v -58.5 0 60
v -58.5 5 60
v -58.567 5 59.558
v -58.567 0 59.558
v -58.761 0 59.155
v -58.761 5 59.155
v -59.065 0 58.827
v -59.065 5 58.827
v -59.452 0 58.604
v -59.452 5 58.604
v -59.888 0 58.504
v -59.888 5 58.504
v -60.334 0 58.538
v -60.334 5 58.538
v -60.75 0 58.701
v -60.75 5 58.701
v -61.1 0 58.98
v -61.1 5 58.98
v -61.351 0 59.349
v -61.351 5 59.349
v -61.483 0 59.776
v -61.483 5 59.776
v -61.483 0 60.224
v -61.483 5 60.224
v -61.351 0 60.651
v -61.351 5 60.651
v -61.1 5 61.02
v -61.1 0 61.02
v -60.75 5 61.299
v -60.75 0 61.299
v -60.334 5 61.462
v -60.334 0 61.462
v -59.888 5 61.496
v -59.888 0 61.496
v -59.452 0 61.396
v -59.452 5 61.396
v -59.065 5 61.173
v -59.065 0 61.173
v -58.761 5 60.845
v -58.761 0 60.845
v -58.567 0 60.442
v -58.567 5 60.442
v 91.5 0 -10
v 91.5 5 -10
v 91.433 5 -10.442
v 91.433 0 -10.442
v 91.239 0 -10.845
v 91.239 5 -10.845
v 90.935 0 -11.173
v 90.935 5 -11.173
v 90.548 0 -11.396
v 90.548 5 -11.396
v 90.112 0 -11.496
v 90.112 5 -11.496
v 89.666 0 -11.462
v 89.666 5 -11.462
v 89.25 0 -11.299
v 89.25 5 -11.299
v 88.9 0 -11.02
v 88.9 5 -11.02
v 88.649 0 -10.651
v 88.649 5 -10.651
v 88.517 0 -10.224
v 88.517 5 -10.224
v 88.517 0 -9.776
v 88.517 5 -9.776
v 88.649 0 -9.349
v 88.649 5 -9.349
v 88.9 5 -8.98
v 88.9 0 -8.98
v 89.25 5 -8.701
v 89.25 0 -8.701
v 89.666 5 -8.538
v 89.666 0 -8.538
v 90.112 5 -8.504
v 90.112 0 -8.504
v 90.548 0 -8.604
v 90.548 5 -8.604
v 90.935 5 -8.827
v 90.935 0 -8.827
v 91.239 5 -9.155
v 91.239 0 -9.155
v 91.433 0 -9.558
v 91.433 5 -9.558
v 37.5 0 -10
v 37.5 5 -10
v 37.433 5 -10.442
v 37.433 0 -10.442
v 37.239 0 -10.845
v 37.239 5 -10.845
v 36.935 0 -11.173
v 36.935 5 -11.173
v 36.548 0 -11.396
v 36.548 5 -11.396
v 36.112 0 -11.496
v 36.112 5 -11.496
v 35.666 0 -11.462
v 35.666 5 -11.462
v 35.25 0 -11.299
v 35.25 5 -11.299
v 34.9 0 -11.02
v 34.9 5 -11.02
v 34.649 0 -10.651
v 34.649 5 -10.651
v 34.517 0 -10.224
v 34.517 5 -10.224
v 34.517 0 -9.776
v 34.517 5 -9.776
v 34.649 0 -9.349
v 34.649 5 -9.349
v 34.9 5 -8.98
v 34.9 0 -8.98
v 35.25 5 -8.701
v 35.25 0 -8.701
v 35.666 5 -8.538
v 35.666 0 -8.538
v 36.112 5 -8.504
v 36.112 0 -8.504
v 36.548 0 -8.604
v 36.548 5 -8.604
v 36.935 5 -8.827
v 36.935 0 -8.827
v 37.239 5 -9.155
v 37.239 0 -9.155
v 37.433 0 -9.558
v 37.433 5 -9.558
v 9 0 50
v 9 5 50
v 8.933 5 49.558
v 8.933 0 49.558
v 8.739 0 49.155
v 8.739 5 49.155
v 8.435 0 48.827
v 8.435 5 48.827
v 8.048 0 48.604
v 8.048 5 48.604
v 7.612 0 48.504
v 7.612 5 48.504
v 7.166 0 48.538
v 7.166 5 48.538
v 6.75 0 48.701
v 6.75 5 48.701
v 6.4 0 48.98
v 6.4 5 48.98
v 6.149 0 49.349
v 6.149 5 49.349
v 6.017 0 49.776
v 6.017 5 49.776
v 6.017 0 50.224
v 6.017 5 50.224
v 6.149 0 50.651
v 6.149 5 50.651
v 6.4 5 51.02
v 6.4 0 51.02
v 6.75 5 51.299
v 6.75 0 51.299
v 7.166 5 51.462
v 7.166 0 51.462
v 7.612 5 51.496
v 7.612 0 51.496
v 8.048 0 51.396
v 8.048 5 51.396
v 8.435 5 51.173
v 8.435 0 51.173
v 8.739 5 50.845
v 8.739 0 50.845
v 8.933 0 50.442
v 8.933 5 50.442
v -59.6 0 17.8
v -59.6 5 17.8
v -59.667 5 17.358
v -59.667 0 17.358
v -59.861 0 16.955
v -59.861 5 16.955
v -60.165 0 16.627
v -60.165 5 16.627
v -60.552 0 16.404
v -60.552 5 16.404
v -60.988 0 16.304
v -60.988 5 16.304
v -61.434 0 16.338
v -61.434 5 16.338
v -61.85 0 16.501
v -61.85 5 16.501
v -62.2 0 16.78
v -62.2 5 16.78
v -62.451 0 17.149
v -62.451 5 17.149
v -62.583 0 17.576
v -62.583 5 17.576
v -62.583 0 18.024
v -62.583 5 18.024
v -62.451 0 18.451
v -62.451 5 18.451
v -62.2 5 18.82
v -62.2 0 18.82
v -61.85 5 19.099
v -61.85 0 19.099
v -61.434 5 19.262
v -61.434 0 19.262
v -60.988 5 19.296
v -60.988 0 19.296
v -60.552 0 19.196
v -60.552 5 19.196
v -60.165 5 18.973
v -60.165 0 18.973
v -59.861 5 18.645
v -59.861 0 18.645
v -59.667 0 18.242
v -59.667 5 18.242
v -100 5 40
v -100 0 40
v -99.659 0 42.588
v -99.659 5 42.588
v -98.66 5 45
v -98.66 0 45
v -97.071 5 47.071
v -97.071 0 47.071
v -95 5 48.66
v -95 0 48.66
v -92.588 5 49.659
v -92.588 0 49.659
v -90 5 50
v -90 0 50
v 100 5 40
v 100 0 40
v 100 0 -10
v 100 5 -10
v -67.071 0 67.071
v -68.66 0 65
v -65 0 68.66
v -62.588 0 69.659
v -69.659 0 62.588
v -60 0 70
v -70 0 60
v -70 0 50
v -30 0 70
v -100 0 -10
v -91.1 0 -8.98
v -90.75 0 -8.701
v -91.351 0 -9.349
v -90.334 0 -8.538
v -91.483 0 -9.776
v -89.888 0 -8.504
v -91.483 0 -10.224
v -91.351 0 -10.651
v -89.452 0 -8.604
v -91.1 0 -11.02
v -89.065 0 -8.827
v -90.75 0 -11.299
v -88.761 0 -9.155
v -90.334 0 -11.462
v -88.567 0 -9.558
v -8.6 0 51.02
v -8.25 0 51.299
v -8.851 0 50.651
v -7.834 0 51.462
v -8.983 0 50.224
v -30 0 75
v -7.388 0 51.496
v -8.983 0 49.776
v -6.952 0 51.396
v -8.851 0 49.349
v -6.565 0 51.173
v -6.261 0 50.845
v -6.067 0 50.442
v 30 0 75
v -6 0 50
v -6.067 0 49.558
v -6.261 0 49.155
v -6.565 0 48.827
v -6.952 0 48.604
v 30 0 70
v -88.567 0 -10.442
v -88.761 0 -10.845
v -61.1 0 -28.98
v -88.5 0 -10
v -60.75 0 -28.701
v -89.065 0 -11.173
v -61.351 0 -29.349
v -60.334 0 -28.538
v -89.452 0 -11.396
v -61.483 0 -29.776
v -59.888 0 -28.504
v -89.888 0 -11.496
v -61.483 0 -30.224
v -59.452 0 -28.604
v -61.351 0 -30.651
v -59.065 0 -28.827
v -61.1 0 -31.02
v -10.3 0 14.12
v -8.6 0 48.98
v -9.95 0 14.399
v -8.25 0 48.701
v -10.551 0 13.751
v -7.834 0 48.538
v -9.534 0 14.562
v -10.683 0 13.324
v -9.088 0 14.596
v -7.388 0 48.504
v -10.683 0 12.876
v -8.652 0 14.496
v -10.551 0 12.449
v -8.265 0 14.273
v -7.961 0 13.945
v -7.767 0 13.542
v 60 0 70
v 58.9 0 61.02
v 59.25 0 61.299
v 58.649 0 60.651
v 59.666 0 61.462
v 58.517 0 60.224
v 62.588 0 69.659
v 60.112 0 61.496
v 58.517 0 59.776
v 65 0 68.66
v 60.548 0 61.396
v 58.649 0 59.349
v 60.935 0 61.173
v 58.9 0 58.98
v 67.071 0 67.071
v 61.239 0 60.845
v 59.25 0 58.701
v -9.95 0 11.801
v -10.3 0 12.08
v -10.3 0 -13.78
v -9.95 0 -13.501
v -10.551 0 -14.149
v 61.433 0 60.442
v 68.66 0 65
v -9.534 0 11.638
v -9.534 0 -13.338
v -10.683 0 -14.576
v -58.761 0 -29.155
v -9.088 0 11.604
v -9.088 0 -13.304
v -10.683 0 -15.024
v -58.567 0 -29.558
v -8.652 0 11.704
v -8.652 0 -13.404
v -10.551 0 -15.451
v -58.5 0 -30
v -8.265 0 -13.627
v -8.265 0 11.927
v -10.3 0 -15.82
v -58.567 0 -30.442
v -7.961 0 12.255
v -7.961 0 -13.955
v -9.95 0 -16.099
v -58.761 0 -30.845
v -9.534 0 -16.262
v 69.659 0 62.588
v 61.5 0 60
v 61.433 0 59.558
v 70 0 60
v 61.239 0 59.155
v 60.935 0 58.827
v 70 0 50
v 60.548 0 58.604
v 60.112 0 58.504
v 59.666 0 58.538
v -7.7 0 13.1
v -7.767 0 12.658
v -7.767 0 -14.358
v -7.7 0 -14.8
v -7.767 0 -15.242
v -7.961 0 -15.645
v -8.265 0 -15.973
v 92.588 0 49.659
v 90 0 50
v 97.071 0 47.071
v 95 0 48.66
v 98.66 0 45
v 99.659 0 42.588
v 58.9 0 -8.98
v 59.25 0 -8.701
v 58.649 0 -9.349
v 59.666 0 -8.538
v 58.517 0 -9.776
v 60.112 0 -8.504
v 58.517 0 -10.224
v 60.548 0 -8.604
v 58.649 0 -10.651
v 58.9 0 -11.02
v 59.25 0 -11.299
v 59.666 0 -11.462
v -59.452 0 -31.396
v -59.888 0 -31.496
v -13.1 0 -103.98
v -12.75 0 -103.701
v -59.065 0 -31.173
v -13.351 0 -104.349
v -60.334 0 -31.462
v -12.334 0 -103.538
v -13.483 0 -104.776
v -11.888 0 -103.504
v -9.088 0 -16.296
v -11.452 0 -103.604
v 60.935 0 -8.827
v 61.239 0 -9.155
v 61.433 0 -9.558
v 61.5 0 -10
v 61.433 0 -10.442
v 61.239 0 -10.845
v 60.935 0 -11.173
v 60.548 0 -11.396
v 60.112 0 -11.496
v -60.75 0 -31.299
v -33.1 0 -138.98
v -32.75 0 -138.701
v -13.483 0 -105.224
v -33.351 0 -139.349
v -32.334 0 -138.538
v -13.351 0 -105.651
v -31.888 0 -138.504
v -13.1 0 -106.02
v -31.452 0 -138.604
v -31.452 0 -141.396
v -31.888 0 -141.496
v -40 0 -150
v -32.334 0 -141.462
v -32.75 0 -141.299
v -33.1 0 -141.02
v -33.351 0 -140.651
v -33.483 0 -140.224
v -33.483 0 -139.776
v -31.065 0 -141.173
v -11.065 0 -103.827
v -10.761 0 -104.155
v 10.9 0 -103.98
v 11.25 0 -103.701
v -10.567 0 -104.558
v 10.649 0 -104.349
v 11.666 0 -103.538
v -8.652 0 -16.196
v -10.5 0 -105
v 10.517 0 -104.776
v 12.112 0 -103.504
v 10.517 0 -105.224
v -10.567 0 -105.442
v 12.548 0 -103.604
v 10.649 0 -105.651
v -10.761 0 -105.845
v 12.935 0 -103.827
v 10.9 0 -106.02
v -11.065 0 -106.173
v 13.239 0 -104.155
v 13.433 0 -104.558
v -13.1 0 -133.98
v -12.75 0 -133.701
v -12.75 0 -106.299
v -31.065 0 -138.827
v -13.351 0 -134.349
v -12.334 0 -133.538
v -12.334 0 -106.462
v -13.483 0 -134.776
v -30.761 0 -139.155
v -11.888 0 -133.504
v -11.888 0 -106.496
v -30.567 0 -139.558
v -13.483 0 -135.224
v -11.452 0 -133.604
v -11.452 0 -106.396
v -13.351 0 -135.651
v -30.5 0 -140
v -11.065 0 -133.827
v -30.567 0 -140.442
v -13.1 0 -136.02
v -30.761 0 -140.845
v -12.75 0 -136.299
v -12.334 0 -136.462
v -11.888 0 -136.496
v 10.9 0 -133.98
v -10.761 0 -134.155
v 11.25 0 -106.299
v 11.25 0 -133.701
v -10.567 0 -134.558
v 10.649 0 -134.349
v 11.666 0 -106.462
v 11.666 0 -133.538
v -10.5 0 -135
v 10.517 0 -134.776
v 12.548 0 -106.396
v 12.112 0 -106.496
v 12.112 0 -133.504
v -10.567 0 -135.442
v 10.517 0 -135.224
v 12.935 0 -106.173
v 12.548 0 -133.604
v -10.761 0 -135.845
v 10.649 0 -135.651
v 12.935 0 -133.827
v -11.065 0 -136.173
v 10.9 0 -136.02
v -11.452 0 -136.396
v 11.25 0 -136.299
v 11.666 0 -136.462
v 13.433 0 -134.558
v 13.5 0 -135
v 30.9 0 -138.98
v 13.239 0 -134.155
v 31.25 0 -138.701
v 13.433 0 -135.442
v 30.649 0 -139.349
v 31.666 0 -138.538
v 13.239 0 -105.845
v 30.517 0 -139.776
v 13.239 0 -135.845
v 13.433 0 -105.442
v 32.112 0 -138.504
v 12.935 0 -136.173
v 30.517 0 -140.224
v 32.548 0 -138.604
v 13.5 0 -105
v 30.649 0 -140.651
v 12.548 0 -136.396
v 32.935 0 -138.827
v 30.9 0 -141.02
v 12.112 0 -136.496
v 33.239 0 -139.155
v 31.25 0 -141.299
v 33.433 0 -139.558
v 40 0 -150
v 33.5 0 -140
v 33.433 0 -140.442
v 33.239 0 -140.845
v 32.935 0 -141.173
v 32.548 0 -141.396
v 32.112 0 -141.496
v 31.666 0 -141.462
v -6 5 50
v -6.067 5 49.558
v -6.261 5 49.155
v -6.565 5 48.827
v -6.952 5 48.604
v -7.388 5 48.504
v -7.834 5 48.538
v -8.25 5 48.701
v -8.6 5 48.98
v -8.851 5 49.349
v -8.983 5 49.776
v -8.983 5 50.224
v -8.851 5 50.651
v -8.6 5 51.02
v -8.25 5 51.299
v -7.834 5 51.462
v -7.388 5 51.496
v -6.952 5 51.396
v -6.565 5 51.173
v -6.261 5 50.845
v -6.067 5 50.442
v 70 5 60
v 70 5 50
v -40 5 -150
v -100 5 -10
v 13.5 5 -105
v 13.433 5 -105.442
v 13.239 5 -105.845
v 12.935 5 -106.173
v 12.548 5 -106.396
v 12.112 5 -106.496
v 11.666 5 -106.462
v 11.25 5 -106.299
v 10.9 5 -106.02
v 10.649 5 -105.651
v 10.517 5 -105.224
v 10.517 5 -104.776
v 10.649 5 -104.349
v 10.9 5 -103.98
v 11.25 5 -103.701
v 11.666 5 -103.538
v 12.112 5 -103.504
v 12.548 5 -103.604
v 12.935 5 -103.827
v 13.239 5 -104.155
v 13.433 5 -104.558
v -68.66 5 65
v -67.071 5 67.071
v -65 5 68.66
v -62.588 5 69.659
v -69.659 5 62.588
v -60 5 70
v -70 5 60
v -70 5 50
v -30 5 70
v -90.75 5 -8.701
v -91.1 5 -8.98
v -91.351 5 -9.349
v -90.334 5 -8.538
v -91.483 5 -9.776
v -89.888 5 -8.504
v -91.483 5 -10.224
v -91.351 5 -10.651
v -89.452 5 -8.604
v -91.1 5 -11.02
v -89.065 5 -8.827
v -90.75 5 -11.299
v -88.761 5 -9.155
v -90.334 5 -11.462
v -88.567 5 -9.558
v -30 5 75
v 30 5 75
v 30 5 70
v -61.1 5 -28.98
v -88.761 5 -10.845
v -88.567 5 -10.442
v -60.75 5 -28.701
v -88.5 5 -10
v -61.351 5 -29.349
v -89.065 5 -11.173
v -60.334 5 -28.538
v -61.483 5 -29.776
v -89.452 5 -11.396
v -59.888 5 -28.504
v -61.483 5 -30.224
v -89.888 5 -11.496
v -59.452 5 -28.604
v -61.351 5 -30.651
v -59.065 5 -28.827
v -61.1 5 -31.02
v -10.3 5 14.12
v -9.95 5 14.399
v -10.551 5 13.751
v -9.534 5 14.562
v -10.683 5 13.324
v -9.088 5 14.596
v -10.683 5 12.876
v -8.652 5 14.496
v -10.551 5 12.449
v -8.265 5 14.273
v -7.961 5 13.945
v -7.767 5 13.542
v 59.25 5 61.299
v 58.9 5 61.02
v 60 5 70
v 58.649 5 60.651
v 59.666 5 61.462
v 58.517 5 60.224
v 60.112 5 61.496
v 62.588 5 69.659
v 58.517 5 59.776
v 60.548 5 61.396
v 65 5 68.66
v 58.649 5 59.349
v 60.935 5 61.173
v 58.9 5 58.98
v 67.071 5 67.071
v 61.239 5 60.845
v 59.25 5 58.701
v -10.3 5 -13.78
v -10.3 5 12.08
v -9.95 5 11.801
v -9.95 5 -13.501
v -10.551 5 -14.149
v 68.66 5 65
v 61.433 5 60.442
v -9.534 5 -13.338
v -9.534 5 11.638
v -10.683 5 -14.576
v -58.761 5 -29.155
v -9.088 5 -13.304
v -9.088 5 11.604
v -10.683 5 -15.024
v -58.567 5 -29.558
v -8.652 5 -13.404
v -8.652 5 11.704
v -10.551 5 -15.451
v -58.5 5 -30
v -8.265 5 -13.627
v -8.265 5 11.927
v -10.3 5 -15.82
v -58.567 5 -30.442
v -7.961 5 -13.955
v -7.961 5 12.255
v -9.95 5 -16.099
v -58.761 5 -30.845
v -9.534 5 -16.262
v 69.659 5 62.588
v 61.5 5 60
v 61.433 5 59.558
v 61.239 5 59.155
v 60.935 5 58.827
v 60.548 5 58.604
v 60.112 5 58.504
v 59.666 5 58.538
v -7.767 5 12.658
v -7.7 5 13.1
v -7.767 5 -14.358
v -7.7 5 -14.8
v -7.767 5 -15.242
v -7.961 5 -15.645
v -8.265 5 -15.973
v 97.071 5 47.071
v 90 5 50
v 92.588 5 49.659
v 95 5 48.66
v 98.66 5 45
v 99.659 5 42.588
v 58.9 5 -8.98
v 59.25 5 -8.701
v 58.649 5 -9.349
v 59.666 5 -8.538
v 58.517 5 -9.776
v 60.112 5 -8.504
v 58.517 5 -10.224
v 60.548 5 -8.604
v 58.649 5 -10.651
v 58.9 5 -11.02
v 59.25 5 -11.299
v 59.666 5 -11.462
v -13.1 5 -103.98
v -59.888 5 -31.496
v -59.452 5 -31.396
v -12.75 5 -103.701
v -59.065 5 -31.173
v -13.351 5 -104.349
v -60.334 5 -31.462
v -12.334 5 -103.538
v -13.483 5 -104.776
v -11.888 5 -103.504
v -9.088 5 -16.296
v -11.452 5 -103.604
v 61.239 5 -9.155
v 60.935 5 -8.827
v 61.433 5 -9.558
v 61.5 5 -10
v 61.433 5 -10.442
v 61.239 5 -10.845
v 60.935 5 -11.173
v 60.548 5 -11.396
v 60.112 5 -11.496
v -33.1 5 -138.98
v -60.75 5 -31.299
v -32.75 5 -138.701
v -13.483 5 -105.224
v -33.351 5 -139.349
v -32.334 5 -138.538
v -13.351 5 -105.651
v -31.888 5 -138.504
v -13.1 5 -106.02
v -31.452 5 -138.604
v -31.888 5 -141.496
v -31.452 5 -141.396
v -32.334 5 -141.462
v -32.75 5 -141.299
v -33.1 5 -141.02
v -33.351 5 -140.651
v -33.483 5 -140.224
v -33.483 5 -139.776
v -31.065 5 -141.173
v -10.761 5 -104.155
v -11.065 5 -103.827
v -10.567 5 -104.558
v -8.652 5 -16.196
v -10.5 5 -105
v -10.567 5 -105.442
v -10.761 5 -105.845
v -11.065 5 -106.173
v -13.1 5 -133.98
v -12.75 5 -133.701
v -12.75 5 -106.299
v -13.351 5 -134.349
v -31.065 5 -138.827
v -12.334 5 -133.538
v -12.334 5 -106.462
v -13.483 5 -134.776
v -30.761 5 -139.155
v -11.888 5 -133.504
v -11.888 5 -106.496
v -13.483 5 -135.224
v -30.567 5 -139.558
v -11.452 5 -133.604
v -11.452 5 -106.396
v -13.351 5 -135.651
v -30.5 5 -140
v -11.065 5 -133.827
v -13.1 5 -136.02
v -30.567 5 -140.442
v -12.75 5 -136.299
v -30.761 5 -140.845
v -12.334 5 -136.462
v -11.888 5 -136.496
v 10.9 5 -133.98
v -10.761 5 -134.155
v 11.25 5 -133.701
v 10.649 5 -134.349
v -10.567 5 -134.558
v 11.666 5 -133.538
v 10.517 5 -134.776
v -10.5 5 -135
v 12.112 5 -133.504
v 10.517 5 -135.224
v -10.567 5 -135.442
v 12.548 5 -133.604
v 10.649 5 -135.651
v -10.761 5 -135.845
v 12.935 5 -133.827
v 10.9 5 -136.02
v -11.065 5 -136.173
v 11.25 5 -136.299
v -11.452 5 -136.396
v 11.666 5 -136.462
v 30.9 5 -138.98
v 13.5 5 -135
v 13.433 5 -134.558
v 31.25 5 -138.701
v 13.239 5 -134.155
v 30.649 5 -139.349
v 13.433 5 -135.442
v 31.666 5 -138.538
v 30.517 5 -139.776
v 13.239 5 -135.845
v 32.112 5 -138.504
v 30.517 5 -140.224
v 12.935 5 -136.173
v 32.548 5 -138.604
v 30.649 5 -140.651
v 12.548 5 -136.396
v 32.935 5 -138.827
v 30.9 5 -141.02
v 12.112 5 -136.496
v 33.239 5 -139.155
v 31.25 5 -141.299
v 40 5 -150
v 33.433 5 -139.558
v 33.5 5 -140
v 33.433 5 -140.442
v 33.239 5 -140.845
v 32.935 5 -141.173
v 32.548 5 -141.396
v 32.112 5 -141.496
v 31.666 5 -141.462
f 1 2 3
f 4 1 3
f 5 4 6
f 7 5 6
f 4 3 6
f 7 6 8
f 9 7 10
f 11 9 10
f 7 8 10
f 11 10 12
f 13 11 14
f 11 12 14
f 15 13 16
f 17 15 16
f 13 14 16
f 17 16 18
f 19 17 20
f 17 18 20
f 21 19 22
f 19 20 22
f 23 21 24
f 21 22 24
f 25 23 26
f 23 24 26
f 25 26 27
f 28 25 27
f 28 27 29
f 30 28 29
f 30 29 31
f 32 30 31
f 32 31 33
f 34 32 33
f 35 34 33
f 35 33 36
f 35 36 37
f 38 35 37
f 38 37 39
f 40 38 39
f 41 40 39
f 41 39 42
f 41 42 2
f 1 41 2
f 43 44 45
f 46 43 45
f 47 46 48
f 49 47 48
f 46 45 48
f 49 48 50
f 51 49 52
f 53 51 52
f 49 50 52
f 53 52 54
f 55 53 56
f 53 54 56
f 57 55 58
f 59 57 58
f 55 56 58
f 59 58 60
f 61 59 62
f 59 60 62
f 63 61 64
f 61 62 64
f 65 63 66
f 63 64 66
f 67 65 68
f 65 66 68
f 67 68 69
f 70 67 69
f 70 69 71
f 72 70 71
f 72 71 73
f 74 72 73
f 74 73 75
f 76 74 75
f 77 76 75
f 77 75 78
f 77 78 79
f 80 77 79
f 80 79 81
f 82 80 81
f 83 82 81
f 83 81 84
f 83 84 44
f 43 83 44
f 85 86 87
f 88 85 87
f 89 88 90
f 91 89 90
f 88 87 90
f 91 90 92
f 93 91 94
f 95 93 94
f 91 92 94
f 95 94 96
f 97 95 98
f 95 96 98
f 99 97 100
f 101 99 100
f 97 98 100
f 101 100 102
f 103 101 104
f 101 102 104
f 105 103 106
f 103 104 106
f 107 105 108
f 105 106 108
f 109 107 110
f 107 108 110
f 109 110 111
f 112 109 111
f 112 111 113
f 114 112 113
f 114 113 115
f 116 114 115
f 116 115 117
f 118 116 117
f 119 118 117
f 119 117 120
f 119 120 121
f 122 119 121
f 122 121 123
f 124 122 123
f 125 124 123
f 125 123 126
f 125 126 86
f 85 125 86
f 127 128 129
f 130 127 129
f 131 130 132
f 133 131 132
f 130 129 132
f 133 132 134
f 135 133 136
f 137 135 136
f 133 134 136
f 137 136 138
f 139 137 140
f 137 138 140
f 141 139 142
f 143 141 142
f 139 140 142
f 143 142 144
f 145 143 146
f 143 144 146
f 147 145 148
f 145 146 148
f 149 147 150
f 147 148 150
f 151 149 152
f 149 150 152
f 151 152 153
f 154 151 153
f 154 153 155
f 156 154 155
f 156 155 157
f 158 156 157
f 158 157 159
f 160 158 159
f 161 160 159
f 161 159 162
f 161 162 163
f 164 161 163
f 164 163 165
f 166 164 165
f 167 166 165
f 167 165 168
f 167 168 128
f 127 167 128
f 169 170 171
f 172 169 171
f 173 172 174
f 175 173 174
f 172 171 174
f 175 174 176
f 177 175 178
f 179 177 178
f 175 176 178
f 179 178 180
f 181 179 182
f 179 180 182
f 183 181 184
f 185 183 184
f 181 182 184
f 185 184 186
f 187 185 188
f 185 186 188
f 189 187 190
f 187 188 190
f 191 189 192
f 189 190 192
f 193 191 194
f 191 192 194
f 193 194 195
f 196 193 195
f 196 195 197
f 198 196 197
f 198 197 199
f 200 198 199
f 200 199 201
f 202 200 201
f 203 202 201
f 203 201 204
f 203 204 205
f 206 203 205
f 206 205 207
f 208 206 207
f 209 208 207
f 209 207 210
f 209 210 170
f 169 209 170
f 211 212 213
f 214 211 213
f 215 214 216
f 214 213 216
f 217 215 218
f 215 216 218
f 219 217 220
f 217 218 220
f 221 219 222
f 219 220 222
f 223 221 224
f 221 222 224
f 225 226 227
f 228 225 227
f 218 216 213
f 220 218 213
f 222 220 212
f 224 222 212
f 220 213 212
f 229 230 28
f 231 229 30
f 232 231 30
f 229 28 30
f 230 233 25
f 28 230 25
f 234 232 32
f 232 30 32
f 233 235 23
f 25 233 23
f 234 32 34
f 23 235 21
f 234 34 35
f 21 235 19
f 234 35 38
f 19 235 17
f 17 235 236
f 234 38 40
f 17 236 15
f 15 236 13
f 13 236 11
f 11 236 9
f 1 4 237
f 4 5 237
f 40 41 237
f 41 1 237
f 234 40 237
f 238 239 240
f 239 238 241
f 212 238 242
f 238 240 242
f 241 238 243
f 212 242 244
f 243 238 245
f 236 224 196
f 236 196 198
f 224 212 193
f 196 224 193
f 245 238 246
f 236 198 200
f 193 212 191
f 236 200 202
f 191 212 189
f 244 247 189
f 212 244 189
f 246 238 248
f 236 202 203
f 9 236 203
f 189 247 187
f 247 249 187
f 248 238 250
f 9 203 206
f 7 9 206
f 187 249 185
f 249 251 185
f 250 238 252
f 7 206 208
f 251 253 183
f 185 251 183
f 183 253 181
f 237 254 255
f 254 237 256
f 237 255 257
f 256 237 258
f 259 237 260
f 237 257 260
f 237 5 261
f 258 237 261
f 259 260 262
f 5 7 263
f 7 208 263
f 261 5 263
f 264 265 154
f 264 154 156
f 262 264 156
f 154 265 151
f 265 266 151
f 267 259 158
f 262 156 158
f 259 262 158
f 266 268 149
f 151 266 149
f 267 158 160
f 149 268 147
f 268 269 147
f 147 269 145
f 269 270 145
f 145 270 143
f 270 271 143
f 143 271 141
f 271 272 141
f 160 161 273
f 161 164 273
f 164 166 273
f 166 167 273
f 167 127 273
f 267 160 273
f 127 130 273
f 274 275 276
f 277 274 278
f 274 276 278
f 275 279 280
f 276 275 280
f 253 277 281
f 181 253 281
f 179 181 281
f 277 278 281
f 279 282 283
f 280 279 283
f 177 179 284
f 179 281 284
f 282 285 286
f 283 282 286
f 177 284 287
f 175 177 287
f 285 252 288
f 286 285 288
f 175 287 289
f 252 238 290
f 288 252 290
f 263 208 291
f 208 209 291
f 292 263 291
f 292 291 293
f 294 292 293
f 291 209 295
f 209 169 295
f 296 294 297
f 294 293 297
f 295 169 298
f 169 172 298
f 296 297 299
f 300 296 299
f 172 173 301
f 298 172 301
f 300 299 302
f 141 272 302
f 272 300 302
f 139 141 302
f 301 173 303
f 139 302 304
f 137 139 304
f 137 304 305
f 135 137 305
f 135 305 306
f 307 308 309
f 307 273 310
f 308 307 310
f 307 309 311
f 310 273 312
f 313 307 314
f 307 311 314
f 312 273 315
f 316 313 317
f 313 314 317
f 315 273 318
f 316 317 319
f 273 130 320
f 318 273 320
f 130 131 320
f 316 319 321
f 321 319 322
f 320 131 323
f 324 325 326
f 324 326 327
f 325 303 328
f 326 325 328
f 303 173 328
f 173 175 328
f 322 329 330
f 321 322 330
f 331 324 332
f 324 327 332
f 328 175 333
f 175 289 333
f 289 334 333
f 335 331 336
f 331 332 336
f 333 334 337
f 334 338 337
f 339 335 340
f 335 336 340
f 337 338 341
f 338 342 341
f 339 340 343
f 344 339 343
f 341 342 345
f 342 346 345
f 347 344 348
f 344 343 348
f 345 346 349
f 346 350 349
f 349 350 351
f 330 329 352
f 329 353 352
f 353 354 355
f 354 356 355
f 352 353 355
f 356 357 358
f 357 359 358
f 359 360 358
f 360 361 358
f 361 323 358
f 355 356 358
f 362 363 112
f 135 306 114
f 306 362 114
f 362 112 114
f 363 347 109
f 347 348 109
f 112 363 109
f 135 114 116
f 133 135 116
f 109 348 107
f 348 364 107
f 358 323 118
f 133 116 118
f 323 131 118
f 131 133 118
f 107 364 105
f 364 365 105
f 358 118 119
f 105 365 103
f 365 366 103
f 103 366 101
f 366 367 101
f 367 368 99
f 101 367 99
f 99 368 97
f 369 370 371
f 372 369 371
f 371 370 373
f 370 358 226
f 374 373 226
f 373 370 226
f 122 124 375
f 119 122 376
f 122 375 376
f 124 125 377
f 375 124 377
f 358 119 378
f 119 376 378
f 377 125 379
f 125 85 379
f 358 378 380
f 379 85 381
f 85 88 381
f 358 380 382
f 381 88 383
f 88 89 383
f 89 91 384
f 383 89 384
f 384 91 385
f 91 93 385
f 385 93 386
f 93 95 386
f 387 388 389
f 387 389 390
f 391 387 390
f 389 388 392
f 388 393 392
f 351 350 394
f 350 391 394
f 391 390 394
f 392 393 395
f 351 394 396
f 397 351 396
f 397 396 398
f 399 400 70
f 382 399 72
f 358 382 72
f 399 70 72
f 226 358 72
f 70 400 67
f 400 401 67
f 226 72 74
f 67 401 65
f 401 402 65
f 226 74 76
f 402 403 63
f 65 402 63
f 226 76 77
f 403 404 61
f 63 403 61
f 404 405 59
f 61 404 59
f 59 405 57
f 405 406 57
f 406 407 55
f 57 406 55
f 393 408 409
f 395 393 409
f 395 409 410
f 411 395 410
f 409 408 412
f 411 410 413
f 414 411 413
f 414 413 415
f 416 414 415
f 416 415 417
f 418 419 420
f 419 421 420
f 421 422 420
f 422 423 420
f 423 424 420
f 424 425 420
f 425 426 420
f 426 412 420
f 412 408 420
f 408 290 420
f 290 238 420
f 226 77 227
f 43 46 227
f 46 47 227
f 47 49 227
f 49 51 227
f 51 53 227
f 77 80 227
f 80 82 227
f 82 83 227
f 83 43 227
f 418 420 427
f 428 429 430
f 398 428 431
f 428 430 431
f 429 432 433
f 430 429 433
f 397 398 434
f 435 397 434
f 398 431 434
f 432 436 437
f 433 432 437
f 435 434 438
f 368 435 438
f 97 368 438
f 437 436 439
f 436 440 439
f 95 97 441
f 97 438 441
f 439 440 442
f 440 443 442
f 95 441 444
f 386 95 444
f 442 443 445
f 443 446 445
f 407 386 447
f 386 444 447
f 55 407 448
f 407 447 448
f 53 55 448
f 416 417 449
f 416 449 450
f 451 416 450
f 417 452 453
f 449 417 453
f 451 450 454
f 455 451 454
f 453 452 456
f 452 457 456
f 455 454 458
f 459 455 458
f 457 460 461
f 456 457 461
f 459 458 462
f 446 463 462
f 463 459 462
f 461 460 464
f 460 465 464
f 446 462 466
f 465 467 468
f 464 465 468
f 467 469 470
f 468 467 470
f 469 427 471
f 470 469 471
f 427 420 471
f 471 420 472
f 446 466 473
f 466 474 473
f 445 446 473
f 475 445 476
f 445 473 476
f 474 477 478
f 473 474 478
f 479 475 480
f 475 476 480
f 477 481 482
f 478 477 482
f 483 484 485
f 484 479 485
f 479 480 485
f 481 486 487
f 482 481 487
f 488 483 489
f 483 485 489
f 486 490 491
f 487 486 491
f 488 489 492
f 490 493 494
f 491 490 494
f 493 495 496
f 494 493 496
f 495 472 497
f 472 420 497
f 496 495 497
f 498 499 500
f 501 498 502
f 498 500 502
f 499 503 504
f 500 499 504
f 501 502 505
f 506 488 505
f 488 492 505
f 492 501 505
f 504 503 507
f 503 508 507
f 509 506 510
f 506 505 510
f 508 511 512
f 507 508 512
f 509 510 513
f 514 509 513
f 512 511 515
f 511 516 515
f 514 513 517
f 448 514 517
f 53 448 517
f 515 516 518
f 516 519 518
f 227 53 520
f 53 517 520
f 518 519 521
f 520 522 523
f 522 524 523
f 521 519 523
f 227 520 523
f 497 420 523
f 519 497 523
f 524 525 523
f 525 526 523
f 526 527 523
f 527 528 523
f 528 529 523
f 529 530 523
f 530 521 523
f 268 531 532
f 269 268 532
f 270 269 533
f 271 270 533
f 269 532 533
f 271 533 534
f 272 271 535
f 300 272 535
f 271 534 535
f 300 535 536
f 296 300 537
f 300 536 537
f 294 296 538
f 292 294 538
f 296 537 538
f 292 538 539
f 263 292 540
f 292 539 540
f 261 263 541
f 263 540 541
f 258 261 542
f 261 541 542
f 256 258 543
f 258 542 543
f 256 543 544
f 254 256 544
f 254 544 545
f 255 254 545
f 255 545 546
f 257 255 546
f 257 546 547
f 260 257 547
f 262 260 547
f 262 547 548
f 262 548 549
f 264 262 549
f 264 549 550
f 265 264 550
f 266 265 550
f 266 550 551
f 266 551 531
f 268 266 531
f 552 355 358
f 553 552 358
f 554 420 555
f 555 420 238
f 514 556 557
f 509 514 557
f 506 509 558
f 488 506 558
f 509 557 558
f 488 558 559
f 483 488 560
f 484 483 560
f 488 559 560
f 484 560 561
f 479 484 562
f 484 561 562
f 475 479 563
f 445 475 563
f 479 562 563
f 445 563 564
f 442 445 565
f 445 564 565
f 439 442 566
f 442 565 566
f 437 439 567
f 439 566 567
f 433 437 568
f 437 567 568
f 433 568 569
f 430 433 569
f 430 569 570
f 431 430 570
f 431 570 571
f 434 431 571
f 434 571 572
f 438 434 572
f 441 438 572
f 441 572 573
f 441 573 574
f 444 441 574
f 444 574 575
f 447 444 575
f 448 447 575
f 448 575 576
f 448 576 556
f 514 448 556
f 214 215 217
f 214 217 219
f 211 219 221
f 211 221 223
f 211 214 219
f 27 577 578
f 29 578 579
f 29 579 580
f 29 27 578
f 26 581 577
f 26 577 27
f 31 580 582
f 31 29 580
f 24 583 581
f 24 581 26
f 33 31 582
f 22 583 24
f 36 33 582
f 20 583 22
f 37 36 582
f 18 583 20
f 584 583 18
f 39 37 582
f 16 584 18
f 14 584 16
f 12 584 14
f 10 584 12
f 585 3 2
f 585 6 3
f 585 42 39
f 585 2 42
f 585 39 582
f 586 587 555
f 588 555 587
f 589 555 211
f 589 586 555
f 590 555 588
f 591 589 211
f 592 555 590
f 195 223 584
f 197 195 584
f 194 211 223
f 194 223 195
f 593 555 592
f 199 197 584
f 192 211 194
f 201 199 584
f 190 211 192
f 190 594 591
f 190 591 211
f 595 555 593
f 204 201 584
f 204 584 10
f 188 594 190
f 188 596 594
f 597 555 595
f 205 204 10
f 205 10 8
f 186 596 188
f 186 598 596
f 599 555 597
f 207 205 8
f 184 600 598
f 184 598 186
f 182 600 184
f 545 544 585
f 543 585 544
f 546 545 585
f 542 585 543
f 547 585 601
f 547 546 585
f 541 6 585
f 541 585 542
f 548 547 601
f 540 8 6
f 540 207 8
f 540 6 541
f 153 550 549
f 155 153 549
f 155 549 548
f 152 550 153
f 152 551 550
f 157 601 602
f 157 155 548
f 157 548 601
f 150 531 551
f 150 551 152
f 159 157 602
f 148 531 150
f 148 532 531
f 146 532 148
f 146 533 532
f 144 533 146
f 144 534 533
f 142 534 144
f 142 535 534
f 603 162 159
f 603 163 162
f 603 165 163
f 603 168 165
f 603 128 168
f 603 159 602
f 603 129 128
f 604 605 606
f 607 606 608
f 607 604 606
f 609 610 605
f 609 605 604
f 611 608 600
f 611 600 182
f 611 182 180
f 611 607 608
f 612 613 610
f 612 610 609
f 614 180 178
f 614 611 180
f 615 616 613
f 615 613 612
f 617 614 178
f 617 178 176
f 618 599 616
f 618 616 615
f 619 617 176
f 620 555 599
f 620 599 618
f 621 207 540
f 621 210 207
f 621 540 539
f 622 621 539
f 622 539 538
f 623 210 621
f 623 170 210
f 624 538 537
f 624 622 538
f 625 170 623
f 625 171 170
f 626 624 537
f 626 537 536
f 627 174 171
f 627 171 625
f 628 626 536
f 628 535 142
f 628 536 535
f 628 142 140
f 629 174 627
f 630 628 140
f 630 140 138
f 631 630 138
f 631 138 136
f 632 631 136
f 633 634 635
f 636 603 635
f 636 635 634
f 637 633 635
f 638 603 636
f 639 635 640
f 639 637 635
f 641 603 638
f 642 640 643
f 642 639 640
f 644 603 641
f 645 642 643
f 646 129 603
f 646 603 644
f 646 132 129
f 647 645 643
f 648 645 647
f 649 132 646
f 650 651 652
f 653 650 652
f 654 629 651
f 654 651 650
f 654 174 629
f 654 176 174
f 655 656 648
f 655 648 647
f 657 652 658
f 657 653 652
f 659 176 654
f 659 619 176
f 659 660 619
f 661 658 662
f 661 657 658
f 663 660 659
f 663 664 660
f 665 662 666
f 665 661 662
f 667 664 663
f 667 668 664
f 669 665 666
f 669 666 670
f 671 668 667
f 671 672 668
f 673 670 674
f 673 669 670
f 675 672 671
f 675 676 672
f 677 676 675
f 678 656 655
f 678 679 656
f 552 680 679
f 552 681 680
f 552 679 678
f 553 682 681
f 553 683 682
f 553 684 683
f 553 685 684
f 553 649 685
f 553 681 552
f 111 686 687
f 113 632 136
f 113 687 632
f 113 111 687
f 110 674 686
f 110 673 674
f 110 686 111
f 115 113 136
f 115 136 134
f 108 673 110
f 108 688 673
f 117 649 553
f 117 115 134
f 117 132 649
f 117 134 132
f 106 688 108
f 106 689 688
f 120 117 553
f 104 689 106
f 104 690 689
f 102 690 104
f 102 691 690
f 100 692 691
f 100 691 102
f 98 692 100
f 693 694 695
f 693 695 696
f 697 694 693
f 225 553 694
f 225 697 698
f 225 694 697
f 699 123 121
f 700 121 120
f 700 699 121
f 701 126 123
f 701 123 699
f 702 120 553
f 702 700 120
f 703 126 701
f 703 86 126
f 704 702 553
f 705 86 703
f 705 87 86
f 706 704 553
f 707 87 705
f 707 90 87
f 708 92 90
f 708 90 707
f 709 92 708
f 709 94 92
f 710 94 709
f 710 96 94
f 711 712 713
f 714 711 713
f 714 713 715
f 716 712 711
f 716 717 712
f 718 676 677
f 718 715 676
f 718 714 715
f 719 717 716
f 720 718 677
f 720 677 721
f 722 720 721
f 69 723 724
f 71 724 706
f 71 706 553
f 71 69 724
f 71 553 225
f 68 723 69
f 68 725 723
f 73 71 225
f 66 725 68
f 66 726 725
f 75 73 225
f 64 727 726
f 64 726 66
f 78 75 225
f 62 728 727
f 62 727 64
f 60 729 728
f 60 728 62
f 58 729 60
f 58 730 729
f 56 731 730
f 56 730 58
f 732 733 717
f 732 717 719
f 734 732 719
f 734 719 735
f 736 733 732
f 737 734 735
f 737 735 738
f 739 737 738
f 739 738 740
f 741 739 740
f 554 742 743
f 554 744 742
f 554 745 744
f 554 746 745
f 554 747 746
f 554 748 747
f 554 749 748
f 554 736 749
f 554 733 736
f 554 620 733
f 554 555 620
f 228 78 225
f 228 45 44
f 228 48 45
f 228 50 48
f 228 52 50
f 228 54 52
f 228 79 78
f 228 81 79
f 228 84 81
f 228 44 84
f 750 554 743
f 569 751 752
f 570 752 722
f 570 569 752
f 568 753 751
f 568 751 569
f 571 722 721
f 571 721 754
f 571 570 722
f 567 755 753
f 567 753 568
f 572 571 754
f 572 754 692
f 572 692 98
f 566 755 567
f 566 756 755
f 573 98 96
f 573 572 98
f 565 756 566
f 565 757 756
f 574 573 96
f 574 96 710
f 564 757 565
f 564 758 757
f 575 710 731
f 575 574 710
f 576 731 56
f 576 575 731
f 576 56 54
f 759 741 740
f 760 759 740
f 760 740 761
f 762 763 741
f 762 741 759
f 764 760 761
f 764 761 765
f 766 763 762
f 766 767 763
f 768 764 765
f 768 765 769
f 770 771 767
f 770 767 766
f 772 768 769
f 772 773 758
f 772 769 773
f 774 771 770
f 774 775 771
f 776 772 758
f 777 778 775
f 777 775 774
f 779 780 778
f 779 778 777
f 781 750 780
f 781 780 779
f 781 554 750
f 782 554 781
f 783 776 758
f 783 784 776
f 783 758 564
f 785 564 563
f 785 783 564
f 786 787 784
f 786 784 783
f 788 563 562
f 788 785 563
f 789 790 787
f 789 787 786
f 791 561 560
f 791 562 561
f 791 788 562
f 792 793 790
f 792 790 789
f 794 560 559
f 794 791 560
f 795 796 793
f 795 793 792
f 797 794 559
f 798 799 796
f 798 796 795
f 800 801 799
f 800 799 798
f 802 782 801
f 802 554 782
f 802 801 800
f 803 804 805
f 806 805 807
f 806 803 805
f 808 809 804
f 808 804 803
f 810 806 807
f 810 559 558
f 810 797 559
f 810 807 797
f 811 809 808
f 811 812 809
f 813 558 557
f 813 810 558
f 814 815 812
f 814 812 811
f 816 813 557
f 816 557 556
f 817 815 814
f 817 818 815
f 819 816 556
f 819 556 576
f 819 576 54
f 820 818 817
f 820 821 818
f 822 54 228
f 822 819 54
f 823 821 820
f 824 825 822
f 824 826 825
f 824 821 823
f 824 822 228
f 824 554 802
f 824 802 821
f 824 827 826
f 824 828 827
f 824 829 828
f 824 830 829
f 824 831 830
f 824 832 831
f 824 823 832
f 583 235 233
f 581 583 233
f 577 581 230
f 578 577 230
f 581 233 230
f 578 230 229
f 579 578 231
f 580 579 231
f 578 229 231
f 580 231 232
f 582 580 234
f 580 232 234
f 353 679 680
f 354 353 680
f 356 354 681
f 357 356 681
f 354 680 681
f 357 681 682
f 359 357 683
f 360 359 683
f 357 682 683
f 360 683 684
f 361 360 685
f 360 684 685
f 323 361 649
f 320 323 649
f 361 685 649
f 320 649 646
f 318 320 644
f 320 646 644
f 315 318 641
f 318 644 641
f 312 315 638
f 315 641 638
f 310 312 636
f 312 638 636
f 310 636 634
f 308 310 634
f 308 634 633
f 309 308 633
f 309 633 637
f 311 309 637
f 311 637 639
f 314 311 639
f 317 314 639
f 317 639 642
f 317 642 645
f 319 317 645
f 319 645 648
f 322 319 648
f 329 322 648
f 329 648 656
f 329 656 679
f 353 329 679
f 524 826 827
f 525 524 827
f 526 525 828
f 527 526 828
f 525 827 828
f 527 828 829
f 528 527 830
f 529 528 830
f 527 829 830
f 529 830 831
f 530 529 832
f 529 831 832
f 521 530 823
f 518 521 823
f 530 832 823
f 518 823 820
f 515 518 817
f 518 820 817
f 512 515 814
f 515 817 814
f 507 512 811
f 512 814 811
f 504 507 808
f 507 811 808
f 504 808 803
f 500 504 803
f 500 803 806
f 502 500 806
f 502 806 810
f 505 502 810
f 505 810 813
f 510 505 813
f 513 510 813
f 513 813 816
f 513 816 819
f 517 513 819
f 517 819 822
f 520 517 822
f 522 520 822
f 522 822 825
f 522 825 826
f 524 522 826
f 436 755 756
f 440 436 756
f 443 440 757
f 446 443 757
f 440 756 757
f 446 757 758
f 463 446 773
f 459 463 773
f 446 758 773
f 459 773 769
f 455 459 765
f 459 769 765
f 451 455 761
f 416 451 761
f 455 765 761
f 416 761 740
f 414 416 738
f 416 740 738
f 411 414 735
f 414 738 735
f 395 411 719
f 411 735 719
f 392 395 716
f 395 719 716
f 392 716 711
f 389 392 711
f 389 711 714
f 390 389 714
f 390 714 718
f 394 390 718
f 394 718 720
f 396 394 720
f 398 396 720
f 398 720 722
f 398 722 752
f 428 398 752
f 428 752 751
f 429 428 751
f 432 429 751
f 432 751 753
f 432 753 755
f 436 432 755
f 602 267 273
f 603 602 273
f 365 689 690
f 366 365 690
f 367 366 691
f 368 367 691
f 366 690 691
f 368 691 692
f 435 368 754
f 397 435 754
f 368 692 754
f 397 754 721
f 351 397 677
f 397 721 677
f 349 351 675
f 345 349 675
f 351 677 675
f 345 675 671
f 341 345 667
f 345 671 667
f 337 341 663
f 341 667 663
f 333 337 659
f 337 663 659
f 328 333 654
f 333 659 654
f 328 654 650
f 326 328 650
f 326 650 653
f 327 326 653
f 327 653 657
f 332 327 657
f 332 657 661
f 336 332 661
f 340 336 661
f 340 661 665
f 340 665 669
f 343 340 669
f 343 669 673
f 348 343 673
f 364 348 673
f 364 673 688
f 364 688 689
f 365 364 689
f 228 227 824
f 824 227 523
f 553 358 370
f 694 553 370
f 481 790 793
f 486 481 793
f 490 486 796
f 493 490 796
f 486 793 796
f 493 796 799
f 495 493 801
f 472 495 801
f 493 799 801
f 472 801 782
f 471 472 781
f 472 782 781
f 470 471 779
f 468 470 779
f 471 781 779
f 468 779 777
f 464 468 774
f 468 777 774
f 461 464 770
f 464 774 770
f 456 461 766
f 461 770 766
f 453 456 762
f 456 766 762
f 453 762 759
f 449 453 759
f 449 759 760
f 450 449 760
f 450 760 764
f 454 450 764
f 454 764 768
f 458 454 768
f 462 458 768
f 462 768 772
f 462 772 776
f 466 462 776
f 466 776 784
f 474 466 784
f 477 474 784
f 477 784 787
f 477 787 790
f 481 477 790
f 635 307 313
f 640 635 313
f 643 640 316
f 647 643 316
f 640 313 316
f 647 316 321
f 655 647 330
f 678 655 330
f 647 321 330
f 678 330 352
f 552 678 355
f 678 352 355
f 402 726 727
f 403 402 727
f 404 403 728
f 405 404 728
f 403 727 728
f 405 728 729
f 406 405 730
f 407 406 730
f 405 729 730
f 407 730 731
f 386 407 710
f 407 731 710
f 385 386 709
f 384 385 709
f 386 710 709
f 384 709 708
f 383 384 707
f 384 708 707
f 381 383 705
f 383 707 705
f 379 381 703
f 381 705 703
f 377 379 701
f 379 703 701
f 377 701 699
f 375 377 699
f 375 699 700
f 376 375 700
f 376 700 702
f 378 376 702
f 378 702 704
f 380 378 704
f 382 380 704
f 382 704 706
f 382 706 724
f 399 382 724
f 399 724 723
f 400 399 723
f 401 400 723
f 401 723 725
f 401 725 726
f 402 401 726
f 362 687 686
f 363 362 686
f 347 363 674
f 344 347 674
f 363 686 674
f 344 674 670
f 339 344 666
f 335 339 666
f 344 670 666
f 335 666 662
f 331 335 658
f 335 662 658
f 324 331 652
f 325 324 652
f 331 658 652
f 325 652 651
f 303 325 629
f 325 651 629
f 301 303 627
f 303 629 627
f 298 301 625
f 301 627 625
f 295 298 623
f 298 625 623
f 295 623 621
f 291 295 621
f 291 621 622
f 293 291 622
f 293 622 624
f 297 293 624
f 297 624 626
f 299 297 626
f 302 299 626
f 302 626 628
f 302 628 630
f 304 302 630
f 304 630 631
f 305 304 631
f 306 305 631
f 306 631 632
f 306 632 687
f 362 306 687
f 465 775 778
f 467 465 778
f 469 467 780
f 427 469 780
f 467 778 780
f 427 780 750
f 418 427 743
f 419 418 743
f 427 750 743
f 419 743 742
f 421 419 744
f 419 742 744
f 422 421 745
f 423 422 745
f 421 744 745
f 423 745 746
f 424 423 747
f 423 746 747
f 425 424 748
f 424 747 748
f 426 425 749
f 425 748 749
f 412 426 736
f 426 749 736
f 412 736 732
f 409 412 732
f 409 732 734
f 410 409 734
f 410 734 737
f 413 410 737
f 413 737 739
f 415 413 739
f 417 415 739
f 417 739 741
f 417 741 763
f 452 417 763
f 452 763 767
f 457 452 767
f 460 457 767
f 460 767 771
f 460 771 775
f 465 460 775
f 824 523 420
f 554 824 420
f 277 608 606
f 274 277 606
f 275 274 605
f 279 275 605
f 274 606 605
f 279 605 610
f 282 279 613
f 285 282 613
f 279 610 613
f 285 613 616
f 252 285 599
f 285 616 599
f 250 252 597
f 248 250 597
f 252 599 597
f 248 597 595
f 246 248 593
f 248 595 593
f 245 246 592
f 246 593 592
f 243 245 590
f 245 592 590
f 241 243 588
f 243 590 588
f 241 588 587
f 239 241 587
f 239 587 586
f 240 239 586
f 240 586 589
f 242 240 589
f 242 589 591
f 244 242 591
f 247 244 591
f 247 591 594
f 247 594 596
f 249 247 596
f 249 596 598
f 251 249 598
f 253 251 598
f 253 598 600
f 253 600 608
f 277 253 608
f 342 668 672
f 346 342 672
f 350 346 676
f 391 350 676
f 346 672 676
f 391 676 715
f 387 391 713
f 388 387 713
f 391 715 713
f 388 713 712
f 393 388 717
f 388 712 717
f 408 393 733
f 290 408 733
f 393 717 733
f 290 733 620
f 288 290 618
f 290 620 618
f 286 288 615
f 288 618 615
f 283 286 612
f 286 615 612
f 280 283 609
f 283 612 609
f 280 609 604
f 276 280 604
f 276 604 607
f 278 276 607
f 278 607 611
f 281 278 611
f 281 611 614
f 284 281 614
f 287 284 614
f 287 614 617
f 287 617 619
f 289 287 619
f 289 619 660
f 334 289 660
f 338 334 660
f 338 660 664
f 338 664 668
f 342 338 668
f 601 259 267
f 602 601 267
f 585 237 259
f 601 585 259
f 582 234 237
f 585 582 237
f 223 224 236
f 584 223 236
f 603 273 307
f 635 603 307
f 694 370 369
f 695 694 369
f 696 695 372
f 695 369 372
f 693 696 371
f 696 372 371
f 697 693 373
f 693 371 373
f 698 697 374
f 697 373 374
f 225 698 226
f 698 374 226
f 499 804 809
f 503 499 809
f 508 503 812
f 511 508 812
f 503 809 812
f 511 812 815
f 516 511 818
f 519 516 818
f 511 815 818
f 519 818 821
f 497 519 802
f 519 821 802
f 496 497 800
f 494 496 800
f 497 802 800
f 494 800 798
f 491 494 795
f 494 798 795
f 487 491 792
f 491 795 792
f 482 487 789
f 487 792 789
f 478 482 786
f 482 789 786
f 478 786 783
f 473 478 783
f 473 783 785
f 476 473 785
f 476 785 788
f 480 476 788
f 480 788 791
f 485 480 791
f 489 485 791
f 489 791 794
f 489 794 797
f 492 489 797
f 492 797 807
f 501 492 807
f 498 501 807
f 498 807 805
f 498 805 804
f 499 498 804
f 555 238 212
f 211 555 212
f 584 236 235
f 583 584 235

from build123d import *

# Parameters (mm, degrees)
BOSS_EXTRUDE1_DEPTH = 5
SKETCH3_R           = 1.5
CUT_EXTRUDE2_DEPTH  = 6
SKETCH6_R           = 1.5
CUT_EXTRUDE4_DEPTH  = 6
SKETCH8_R           = 1.5
CUT_EXTRUDE5_DEPTH  = 10
SKETCH9_R           = 1.5
CUT_EXTRUDE6_DEPTH  = 10


with BuildPart() as part:
    # Sketch1 → Boss-Extrude1 (new body)
    with BuildSketch(Plane(origin=(0, 0, 0), x_dir=(1, 0, 0), z_dir=(0, 1, 0))):
        with BuildLine():
            Line((100, -40), (100, 10))
            Line((100, 10), (40, 150))
            Line((40, 150), (-40, 150))
            Line((-40, 150), (-100, 10))
            Line((-100, 10), (-100, -40))
            ThreePointArc((-100, -40), (-97.071067812, -47.071067812), (-90, -50))
            Line((-90, -50), (-70, -50))
            Line((-70, -50), (-70, -60))
            ThreePointArc((-70, -60), (-67.071067812, -67.071067812), (-60, -70))
            Line((-60, -70), (-30, -70))
            Line((-30, -70), (-30, -75))
            Line((-30, -75), (30, -75))
            Line((30, -75), (30, -70))
            Line((30, -70), (60, -70))
            ThreePointArc((60, -70), (67.071067812, -67.071067812), (70, -60))
            Line((70, -60), (70, -50))
            Line((70, -50), (90, -50))
            ThreePointArc((90, -50), (97.071067812, -47.071067812), (100, -40))
        make_face()
    extrude(amount=BOSS_EXTRUDE1_DEPTH)

    # Sketch3 → Cut-Extrude2 (cut, through all)
    with BuildSketch(Plane(origin=(0, 5, 0), x_dir=(1, 0, 0), z_dir=(0, 1, 0))):
        with Locations((-61.1, -17.8)):
            Circle(SKETCH3_R)
        with Locations((-9.2, -13.1)):
            Circle(SKETCH3_R)
        with Locations((-9.2, 14.8)):
            Circle(SKETCH3_R)
        with Locations((-60, 30)):
            Circle(SKETCH3_R)
    extrude(amount=-CUT_EXTRUDE2_DEPTH, mode=Mode.SUBTRACT)

    # Sketch6 → Cut-Extrude4 (cut, through all)
    with BuildSketch(Plane(origin=(0, 5, 0), x_dir=(1, 0, 0), z_dir=(0, 1, 0))):
        with Locations((12, 135)):
            Circle(SKETCH6_R)
        with Locations((-12, 135)):
            Circle(SKETCH6_R)
        with Locations((12, 105)):
            Circle(SKETCH6_R)
        with Locations((-12, 105)):
            Circle(SKETCH6_R)
    extrude(amount=-CUT_EXTRUDE4_DEPTH, mode=Mode.SUBTRACT)

    # Sketch8 → Cut-Extrude5 (cut)
    with BuildSketch(Plane(origin=(0, 5, 0), x_dir=(1, 0, 0), z_dir=(0, 1, 0))):
        with Locations((-90, 10)):
            Circle(SKETCH8_R)
        with Locations((-32, 140)):
            Circle(SKETCH8_R)
        with Locations((90, 10)):
            Circle(SKETCH8_R)
        with Locations((32, 140)):
            Circle(SKETCH8_R)
        with Locations((-60, -60)):
            Circle(SKETCH8_R)
        with Locations((60, -60)):
            Circle(SKETCH8_R)
        with Locations((-7.5, -50)):
            Circle(SKETCH8_R)
        with Locations((7.5, -50)):
            Circle(SKETCH8_R)
    extrude(amount=-CUT_EXTRUDE5_DEPTH, mode=Mode.SUBTRACT)

    # Sketch9 → Cut-Extrude6 (cut)
    with BuildSketch(Plane(origin=(0, 5, 0), x_dir=(1, 0, 0), z_dir=(0, 1, 0))):
        with Locations((60, 10)):
            Circle(SKETCH9_R)
        with Locations((36, 10)):
            Circle(SKETCH9_R)
    extrude(amount=-CUT_EXTRUDE6_DEPTH, mode=Mode.SUBTRACT)


solid = part.part
